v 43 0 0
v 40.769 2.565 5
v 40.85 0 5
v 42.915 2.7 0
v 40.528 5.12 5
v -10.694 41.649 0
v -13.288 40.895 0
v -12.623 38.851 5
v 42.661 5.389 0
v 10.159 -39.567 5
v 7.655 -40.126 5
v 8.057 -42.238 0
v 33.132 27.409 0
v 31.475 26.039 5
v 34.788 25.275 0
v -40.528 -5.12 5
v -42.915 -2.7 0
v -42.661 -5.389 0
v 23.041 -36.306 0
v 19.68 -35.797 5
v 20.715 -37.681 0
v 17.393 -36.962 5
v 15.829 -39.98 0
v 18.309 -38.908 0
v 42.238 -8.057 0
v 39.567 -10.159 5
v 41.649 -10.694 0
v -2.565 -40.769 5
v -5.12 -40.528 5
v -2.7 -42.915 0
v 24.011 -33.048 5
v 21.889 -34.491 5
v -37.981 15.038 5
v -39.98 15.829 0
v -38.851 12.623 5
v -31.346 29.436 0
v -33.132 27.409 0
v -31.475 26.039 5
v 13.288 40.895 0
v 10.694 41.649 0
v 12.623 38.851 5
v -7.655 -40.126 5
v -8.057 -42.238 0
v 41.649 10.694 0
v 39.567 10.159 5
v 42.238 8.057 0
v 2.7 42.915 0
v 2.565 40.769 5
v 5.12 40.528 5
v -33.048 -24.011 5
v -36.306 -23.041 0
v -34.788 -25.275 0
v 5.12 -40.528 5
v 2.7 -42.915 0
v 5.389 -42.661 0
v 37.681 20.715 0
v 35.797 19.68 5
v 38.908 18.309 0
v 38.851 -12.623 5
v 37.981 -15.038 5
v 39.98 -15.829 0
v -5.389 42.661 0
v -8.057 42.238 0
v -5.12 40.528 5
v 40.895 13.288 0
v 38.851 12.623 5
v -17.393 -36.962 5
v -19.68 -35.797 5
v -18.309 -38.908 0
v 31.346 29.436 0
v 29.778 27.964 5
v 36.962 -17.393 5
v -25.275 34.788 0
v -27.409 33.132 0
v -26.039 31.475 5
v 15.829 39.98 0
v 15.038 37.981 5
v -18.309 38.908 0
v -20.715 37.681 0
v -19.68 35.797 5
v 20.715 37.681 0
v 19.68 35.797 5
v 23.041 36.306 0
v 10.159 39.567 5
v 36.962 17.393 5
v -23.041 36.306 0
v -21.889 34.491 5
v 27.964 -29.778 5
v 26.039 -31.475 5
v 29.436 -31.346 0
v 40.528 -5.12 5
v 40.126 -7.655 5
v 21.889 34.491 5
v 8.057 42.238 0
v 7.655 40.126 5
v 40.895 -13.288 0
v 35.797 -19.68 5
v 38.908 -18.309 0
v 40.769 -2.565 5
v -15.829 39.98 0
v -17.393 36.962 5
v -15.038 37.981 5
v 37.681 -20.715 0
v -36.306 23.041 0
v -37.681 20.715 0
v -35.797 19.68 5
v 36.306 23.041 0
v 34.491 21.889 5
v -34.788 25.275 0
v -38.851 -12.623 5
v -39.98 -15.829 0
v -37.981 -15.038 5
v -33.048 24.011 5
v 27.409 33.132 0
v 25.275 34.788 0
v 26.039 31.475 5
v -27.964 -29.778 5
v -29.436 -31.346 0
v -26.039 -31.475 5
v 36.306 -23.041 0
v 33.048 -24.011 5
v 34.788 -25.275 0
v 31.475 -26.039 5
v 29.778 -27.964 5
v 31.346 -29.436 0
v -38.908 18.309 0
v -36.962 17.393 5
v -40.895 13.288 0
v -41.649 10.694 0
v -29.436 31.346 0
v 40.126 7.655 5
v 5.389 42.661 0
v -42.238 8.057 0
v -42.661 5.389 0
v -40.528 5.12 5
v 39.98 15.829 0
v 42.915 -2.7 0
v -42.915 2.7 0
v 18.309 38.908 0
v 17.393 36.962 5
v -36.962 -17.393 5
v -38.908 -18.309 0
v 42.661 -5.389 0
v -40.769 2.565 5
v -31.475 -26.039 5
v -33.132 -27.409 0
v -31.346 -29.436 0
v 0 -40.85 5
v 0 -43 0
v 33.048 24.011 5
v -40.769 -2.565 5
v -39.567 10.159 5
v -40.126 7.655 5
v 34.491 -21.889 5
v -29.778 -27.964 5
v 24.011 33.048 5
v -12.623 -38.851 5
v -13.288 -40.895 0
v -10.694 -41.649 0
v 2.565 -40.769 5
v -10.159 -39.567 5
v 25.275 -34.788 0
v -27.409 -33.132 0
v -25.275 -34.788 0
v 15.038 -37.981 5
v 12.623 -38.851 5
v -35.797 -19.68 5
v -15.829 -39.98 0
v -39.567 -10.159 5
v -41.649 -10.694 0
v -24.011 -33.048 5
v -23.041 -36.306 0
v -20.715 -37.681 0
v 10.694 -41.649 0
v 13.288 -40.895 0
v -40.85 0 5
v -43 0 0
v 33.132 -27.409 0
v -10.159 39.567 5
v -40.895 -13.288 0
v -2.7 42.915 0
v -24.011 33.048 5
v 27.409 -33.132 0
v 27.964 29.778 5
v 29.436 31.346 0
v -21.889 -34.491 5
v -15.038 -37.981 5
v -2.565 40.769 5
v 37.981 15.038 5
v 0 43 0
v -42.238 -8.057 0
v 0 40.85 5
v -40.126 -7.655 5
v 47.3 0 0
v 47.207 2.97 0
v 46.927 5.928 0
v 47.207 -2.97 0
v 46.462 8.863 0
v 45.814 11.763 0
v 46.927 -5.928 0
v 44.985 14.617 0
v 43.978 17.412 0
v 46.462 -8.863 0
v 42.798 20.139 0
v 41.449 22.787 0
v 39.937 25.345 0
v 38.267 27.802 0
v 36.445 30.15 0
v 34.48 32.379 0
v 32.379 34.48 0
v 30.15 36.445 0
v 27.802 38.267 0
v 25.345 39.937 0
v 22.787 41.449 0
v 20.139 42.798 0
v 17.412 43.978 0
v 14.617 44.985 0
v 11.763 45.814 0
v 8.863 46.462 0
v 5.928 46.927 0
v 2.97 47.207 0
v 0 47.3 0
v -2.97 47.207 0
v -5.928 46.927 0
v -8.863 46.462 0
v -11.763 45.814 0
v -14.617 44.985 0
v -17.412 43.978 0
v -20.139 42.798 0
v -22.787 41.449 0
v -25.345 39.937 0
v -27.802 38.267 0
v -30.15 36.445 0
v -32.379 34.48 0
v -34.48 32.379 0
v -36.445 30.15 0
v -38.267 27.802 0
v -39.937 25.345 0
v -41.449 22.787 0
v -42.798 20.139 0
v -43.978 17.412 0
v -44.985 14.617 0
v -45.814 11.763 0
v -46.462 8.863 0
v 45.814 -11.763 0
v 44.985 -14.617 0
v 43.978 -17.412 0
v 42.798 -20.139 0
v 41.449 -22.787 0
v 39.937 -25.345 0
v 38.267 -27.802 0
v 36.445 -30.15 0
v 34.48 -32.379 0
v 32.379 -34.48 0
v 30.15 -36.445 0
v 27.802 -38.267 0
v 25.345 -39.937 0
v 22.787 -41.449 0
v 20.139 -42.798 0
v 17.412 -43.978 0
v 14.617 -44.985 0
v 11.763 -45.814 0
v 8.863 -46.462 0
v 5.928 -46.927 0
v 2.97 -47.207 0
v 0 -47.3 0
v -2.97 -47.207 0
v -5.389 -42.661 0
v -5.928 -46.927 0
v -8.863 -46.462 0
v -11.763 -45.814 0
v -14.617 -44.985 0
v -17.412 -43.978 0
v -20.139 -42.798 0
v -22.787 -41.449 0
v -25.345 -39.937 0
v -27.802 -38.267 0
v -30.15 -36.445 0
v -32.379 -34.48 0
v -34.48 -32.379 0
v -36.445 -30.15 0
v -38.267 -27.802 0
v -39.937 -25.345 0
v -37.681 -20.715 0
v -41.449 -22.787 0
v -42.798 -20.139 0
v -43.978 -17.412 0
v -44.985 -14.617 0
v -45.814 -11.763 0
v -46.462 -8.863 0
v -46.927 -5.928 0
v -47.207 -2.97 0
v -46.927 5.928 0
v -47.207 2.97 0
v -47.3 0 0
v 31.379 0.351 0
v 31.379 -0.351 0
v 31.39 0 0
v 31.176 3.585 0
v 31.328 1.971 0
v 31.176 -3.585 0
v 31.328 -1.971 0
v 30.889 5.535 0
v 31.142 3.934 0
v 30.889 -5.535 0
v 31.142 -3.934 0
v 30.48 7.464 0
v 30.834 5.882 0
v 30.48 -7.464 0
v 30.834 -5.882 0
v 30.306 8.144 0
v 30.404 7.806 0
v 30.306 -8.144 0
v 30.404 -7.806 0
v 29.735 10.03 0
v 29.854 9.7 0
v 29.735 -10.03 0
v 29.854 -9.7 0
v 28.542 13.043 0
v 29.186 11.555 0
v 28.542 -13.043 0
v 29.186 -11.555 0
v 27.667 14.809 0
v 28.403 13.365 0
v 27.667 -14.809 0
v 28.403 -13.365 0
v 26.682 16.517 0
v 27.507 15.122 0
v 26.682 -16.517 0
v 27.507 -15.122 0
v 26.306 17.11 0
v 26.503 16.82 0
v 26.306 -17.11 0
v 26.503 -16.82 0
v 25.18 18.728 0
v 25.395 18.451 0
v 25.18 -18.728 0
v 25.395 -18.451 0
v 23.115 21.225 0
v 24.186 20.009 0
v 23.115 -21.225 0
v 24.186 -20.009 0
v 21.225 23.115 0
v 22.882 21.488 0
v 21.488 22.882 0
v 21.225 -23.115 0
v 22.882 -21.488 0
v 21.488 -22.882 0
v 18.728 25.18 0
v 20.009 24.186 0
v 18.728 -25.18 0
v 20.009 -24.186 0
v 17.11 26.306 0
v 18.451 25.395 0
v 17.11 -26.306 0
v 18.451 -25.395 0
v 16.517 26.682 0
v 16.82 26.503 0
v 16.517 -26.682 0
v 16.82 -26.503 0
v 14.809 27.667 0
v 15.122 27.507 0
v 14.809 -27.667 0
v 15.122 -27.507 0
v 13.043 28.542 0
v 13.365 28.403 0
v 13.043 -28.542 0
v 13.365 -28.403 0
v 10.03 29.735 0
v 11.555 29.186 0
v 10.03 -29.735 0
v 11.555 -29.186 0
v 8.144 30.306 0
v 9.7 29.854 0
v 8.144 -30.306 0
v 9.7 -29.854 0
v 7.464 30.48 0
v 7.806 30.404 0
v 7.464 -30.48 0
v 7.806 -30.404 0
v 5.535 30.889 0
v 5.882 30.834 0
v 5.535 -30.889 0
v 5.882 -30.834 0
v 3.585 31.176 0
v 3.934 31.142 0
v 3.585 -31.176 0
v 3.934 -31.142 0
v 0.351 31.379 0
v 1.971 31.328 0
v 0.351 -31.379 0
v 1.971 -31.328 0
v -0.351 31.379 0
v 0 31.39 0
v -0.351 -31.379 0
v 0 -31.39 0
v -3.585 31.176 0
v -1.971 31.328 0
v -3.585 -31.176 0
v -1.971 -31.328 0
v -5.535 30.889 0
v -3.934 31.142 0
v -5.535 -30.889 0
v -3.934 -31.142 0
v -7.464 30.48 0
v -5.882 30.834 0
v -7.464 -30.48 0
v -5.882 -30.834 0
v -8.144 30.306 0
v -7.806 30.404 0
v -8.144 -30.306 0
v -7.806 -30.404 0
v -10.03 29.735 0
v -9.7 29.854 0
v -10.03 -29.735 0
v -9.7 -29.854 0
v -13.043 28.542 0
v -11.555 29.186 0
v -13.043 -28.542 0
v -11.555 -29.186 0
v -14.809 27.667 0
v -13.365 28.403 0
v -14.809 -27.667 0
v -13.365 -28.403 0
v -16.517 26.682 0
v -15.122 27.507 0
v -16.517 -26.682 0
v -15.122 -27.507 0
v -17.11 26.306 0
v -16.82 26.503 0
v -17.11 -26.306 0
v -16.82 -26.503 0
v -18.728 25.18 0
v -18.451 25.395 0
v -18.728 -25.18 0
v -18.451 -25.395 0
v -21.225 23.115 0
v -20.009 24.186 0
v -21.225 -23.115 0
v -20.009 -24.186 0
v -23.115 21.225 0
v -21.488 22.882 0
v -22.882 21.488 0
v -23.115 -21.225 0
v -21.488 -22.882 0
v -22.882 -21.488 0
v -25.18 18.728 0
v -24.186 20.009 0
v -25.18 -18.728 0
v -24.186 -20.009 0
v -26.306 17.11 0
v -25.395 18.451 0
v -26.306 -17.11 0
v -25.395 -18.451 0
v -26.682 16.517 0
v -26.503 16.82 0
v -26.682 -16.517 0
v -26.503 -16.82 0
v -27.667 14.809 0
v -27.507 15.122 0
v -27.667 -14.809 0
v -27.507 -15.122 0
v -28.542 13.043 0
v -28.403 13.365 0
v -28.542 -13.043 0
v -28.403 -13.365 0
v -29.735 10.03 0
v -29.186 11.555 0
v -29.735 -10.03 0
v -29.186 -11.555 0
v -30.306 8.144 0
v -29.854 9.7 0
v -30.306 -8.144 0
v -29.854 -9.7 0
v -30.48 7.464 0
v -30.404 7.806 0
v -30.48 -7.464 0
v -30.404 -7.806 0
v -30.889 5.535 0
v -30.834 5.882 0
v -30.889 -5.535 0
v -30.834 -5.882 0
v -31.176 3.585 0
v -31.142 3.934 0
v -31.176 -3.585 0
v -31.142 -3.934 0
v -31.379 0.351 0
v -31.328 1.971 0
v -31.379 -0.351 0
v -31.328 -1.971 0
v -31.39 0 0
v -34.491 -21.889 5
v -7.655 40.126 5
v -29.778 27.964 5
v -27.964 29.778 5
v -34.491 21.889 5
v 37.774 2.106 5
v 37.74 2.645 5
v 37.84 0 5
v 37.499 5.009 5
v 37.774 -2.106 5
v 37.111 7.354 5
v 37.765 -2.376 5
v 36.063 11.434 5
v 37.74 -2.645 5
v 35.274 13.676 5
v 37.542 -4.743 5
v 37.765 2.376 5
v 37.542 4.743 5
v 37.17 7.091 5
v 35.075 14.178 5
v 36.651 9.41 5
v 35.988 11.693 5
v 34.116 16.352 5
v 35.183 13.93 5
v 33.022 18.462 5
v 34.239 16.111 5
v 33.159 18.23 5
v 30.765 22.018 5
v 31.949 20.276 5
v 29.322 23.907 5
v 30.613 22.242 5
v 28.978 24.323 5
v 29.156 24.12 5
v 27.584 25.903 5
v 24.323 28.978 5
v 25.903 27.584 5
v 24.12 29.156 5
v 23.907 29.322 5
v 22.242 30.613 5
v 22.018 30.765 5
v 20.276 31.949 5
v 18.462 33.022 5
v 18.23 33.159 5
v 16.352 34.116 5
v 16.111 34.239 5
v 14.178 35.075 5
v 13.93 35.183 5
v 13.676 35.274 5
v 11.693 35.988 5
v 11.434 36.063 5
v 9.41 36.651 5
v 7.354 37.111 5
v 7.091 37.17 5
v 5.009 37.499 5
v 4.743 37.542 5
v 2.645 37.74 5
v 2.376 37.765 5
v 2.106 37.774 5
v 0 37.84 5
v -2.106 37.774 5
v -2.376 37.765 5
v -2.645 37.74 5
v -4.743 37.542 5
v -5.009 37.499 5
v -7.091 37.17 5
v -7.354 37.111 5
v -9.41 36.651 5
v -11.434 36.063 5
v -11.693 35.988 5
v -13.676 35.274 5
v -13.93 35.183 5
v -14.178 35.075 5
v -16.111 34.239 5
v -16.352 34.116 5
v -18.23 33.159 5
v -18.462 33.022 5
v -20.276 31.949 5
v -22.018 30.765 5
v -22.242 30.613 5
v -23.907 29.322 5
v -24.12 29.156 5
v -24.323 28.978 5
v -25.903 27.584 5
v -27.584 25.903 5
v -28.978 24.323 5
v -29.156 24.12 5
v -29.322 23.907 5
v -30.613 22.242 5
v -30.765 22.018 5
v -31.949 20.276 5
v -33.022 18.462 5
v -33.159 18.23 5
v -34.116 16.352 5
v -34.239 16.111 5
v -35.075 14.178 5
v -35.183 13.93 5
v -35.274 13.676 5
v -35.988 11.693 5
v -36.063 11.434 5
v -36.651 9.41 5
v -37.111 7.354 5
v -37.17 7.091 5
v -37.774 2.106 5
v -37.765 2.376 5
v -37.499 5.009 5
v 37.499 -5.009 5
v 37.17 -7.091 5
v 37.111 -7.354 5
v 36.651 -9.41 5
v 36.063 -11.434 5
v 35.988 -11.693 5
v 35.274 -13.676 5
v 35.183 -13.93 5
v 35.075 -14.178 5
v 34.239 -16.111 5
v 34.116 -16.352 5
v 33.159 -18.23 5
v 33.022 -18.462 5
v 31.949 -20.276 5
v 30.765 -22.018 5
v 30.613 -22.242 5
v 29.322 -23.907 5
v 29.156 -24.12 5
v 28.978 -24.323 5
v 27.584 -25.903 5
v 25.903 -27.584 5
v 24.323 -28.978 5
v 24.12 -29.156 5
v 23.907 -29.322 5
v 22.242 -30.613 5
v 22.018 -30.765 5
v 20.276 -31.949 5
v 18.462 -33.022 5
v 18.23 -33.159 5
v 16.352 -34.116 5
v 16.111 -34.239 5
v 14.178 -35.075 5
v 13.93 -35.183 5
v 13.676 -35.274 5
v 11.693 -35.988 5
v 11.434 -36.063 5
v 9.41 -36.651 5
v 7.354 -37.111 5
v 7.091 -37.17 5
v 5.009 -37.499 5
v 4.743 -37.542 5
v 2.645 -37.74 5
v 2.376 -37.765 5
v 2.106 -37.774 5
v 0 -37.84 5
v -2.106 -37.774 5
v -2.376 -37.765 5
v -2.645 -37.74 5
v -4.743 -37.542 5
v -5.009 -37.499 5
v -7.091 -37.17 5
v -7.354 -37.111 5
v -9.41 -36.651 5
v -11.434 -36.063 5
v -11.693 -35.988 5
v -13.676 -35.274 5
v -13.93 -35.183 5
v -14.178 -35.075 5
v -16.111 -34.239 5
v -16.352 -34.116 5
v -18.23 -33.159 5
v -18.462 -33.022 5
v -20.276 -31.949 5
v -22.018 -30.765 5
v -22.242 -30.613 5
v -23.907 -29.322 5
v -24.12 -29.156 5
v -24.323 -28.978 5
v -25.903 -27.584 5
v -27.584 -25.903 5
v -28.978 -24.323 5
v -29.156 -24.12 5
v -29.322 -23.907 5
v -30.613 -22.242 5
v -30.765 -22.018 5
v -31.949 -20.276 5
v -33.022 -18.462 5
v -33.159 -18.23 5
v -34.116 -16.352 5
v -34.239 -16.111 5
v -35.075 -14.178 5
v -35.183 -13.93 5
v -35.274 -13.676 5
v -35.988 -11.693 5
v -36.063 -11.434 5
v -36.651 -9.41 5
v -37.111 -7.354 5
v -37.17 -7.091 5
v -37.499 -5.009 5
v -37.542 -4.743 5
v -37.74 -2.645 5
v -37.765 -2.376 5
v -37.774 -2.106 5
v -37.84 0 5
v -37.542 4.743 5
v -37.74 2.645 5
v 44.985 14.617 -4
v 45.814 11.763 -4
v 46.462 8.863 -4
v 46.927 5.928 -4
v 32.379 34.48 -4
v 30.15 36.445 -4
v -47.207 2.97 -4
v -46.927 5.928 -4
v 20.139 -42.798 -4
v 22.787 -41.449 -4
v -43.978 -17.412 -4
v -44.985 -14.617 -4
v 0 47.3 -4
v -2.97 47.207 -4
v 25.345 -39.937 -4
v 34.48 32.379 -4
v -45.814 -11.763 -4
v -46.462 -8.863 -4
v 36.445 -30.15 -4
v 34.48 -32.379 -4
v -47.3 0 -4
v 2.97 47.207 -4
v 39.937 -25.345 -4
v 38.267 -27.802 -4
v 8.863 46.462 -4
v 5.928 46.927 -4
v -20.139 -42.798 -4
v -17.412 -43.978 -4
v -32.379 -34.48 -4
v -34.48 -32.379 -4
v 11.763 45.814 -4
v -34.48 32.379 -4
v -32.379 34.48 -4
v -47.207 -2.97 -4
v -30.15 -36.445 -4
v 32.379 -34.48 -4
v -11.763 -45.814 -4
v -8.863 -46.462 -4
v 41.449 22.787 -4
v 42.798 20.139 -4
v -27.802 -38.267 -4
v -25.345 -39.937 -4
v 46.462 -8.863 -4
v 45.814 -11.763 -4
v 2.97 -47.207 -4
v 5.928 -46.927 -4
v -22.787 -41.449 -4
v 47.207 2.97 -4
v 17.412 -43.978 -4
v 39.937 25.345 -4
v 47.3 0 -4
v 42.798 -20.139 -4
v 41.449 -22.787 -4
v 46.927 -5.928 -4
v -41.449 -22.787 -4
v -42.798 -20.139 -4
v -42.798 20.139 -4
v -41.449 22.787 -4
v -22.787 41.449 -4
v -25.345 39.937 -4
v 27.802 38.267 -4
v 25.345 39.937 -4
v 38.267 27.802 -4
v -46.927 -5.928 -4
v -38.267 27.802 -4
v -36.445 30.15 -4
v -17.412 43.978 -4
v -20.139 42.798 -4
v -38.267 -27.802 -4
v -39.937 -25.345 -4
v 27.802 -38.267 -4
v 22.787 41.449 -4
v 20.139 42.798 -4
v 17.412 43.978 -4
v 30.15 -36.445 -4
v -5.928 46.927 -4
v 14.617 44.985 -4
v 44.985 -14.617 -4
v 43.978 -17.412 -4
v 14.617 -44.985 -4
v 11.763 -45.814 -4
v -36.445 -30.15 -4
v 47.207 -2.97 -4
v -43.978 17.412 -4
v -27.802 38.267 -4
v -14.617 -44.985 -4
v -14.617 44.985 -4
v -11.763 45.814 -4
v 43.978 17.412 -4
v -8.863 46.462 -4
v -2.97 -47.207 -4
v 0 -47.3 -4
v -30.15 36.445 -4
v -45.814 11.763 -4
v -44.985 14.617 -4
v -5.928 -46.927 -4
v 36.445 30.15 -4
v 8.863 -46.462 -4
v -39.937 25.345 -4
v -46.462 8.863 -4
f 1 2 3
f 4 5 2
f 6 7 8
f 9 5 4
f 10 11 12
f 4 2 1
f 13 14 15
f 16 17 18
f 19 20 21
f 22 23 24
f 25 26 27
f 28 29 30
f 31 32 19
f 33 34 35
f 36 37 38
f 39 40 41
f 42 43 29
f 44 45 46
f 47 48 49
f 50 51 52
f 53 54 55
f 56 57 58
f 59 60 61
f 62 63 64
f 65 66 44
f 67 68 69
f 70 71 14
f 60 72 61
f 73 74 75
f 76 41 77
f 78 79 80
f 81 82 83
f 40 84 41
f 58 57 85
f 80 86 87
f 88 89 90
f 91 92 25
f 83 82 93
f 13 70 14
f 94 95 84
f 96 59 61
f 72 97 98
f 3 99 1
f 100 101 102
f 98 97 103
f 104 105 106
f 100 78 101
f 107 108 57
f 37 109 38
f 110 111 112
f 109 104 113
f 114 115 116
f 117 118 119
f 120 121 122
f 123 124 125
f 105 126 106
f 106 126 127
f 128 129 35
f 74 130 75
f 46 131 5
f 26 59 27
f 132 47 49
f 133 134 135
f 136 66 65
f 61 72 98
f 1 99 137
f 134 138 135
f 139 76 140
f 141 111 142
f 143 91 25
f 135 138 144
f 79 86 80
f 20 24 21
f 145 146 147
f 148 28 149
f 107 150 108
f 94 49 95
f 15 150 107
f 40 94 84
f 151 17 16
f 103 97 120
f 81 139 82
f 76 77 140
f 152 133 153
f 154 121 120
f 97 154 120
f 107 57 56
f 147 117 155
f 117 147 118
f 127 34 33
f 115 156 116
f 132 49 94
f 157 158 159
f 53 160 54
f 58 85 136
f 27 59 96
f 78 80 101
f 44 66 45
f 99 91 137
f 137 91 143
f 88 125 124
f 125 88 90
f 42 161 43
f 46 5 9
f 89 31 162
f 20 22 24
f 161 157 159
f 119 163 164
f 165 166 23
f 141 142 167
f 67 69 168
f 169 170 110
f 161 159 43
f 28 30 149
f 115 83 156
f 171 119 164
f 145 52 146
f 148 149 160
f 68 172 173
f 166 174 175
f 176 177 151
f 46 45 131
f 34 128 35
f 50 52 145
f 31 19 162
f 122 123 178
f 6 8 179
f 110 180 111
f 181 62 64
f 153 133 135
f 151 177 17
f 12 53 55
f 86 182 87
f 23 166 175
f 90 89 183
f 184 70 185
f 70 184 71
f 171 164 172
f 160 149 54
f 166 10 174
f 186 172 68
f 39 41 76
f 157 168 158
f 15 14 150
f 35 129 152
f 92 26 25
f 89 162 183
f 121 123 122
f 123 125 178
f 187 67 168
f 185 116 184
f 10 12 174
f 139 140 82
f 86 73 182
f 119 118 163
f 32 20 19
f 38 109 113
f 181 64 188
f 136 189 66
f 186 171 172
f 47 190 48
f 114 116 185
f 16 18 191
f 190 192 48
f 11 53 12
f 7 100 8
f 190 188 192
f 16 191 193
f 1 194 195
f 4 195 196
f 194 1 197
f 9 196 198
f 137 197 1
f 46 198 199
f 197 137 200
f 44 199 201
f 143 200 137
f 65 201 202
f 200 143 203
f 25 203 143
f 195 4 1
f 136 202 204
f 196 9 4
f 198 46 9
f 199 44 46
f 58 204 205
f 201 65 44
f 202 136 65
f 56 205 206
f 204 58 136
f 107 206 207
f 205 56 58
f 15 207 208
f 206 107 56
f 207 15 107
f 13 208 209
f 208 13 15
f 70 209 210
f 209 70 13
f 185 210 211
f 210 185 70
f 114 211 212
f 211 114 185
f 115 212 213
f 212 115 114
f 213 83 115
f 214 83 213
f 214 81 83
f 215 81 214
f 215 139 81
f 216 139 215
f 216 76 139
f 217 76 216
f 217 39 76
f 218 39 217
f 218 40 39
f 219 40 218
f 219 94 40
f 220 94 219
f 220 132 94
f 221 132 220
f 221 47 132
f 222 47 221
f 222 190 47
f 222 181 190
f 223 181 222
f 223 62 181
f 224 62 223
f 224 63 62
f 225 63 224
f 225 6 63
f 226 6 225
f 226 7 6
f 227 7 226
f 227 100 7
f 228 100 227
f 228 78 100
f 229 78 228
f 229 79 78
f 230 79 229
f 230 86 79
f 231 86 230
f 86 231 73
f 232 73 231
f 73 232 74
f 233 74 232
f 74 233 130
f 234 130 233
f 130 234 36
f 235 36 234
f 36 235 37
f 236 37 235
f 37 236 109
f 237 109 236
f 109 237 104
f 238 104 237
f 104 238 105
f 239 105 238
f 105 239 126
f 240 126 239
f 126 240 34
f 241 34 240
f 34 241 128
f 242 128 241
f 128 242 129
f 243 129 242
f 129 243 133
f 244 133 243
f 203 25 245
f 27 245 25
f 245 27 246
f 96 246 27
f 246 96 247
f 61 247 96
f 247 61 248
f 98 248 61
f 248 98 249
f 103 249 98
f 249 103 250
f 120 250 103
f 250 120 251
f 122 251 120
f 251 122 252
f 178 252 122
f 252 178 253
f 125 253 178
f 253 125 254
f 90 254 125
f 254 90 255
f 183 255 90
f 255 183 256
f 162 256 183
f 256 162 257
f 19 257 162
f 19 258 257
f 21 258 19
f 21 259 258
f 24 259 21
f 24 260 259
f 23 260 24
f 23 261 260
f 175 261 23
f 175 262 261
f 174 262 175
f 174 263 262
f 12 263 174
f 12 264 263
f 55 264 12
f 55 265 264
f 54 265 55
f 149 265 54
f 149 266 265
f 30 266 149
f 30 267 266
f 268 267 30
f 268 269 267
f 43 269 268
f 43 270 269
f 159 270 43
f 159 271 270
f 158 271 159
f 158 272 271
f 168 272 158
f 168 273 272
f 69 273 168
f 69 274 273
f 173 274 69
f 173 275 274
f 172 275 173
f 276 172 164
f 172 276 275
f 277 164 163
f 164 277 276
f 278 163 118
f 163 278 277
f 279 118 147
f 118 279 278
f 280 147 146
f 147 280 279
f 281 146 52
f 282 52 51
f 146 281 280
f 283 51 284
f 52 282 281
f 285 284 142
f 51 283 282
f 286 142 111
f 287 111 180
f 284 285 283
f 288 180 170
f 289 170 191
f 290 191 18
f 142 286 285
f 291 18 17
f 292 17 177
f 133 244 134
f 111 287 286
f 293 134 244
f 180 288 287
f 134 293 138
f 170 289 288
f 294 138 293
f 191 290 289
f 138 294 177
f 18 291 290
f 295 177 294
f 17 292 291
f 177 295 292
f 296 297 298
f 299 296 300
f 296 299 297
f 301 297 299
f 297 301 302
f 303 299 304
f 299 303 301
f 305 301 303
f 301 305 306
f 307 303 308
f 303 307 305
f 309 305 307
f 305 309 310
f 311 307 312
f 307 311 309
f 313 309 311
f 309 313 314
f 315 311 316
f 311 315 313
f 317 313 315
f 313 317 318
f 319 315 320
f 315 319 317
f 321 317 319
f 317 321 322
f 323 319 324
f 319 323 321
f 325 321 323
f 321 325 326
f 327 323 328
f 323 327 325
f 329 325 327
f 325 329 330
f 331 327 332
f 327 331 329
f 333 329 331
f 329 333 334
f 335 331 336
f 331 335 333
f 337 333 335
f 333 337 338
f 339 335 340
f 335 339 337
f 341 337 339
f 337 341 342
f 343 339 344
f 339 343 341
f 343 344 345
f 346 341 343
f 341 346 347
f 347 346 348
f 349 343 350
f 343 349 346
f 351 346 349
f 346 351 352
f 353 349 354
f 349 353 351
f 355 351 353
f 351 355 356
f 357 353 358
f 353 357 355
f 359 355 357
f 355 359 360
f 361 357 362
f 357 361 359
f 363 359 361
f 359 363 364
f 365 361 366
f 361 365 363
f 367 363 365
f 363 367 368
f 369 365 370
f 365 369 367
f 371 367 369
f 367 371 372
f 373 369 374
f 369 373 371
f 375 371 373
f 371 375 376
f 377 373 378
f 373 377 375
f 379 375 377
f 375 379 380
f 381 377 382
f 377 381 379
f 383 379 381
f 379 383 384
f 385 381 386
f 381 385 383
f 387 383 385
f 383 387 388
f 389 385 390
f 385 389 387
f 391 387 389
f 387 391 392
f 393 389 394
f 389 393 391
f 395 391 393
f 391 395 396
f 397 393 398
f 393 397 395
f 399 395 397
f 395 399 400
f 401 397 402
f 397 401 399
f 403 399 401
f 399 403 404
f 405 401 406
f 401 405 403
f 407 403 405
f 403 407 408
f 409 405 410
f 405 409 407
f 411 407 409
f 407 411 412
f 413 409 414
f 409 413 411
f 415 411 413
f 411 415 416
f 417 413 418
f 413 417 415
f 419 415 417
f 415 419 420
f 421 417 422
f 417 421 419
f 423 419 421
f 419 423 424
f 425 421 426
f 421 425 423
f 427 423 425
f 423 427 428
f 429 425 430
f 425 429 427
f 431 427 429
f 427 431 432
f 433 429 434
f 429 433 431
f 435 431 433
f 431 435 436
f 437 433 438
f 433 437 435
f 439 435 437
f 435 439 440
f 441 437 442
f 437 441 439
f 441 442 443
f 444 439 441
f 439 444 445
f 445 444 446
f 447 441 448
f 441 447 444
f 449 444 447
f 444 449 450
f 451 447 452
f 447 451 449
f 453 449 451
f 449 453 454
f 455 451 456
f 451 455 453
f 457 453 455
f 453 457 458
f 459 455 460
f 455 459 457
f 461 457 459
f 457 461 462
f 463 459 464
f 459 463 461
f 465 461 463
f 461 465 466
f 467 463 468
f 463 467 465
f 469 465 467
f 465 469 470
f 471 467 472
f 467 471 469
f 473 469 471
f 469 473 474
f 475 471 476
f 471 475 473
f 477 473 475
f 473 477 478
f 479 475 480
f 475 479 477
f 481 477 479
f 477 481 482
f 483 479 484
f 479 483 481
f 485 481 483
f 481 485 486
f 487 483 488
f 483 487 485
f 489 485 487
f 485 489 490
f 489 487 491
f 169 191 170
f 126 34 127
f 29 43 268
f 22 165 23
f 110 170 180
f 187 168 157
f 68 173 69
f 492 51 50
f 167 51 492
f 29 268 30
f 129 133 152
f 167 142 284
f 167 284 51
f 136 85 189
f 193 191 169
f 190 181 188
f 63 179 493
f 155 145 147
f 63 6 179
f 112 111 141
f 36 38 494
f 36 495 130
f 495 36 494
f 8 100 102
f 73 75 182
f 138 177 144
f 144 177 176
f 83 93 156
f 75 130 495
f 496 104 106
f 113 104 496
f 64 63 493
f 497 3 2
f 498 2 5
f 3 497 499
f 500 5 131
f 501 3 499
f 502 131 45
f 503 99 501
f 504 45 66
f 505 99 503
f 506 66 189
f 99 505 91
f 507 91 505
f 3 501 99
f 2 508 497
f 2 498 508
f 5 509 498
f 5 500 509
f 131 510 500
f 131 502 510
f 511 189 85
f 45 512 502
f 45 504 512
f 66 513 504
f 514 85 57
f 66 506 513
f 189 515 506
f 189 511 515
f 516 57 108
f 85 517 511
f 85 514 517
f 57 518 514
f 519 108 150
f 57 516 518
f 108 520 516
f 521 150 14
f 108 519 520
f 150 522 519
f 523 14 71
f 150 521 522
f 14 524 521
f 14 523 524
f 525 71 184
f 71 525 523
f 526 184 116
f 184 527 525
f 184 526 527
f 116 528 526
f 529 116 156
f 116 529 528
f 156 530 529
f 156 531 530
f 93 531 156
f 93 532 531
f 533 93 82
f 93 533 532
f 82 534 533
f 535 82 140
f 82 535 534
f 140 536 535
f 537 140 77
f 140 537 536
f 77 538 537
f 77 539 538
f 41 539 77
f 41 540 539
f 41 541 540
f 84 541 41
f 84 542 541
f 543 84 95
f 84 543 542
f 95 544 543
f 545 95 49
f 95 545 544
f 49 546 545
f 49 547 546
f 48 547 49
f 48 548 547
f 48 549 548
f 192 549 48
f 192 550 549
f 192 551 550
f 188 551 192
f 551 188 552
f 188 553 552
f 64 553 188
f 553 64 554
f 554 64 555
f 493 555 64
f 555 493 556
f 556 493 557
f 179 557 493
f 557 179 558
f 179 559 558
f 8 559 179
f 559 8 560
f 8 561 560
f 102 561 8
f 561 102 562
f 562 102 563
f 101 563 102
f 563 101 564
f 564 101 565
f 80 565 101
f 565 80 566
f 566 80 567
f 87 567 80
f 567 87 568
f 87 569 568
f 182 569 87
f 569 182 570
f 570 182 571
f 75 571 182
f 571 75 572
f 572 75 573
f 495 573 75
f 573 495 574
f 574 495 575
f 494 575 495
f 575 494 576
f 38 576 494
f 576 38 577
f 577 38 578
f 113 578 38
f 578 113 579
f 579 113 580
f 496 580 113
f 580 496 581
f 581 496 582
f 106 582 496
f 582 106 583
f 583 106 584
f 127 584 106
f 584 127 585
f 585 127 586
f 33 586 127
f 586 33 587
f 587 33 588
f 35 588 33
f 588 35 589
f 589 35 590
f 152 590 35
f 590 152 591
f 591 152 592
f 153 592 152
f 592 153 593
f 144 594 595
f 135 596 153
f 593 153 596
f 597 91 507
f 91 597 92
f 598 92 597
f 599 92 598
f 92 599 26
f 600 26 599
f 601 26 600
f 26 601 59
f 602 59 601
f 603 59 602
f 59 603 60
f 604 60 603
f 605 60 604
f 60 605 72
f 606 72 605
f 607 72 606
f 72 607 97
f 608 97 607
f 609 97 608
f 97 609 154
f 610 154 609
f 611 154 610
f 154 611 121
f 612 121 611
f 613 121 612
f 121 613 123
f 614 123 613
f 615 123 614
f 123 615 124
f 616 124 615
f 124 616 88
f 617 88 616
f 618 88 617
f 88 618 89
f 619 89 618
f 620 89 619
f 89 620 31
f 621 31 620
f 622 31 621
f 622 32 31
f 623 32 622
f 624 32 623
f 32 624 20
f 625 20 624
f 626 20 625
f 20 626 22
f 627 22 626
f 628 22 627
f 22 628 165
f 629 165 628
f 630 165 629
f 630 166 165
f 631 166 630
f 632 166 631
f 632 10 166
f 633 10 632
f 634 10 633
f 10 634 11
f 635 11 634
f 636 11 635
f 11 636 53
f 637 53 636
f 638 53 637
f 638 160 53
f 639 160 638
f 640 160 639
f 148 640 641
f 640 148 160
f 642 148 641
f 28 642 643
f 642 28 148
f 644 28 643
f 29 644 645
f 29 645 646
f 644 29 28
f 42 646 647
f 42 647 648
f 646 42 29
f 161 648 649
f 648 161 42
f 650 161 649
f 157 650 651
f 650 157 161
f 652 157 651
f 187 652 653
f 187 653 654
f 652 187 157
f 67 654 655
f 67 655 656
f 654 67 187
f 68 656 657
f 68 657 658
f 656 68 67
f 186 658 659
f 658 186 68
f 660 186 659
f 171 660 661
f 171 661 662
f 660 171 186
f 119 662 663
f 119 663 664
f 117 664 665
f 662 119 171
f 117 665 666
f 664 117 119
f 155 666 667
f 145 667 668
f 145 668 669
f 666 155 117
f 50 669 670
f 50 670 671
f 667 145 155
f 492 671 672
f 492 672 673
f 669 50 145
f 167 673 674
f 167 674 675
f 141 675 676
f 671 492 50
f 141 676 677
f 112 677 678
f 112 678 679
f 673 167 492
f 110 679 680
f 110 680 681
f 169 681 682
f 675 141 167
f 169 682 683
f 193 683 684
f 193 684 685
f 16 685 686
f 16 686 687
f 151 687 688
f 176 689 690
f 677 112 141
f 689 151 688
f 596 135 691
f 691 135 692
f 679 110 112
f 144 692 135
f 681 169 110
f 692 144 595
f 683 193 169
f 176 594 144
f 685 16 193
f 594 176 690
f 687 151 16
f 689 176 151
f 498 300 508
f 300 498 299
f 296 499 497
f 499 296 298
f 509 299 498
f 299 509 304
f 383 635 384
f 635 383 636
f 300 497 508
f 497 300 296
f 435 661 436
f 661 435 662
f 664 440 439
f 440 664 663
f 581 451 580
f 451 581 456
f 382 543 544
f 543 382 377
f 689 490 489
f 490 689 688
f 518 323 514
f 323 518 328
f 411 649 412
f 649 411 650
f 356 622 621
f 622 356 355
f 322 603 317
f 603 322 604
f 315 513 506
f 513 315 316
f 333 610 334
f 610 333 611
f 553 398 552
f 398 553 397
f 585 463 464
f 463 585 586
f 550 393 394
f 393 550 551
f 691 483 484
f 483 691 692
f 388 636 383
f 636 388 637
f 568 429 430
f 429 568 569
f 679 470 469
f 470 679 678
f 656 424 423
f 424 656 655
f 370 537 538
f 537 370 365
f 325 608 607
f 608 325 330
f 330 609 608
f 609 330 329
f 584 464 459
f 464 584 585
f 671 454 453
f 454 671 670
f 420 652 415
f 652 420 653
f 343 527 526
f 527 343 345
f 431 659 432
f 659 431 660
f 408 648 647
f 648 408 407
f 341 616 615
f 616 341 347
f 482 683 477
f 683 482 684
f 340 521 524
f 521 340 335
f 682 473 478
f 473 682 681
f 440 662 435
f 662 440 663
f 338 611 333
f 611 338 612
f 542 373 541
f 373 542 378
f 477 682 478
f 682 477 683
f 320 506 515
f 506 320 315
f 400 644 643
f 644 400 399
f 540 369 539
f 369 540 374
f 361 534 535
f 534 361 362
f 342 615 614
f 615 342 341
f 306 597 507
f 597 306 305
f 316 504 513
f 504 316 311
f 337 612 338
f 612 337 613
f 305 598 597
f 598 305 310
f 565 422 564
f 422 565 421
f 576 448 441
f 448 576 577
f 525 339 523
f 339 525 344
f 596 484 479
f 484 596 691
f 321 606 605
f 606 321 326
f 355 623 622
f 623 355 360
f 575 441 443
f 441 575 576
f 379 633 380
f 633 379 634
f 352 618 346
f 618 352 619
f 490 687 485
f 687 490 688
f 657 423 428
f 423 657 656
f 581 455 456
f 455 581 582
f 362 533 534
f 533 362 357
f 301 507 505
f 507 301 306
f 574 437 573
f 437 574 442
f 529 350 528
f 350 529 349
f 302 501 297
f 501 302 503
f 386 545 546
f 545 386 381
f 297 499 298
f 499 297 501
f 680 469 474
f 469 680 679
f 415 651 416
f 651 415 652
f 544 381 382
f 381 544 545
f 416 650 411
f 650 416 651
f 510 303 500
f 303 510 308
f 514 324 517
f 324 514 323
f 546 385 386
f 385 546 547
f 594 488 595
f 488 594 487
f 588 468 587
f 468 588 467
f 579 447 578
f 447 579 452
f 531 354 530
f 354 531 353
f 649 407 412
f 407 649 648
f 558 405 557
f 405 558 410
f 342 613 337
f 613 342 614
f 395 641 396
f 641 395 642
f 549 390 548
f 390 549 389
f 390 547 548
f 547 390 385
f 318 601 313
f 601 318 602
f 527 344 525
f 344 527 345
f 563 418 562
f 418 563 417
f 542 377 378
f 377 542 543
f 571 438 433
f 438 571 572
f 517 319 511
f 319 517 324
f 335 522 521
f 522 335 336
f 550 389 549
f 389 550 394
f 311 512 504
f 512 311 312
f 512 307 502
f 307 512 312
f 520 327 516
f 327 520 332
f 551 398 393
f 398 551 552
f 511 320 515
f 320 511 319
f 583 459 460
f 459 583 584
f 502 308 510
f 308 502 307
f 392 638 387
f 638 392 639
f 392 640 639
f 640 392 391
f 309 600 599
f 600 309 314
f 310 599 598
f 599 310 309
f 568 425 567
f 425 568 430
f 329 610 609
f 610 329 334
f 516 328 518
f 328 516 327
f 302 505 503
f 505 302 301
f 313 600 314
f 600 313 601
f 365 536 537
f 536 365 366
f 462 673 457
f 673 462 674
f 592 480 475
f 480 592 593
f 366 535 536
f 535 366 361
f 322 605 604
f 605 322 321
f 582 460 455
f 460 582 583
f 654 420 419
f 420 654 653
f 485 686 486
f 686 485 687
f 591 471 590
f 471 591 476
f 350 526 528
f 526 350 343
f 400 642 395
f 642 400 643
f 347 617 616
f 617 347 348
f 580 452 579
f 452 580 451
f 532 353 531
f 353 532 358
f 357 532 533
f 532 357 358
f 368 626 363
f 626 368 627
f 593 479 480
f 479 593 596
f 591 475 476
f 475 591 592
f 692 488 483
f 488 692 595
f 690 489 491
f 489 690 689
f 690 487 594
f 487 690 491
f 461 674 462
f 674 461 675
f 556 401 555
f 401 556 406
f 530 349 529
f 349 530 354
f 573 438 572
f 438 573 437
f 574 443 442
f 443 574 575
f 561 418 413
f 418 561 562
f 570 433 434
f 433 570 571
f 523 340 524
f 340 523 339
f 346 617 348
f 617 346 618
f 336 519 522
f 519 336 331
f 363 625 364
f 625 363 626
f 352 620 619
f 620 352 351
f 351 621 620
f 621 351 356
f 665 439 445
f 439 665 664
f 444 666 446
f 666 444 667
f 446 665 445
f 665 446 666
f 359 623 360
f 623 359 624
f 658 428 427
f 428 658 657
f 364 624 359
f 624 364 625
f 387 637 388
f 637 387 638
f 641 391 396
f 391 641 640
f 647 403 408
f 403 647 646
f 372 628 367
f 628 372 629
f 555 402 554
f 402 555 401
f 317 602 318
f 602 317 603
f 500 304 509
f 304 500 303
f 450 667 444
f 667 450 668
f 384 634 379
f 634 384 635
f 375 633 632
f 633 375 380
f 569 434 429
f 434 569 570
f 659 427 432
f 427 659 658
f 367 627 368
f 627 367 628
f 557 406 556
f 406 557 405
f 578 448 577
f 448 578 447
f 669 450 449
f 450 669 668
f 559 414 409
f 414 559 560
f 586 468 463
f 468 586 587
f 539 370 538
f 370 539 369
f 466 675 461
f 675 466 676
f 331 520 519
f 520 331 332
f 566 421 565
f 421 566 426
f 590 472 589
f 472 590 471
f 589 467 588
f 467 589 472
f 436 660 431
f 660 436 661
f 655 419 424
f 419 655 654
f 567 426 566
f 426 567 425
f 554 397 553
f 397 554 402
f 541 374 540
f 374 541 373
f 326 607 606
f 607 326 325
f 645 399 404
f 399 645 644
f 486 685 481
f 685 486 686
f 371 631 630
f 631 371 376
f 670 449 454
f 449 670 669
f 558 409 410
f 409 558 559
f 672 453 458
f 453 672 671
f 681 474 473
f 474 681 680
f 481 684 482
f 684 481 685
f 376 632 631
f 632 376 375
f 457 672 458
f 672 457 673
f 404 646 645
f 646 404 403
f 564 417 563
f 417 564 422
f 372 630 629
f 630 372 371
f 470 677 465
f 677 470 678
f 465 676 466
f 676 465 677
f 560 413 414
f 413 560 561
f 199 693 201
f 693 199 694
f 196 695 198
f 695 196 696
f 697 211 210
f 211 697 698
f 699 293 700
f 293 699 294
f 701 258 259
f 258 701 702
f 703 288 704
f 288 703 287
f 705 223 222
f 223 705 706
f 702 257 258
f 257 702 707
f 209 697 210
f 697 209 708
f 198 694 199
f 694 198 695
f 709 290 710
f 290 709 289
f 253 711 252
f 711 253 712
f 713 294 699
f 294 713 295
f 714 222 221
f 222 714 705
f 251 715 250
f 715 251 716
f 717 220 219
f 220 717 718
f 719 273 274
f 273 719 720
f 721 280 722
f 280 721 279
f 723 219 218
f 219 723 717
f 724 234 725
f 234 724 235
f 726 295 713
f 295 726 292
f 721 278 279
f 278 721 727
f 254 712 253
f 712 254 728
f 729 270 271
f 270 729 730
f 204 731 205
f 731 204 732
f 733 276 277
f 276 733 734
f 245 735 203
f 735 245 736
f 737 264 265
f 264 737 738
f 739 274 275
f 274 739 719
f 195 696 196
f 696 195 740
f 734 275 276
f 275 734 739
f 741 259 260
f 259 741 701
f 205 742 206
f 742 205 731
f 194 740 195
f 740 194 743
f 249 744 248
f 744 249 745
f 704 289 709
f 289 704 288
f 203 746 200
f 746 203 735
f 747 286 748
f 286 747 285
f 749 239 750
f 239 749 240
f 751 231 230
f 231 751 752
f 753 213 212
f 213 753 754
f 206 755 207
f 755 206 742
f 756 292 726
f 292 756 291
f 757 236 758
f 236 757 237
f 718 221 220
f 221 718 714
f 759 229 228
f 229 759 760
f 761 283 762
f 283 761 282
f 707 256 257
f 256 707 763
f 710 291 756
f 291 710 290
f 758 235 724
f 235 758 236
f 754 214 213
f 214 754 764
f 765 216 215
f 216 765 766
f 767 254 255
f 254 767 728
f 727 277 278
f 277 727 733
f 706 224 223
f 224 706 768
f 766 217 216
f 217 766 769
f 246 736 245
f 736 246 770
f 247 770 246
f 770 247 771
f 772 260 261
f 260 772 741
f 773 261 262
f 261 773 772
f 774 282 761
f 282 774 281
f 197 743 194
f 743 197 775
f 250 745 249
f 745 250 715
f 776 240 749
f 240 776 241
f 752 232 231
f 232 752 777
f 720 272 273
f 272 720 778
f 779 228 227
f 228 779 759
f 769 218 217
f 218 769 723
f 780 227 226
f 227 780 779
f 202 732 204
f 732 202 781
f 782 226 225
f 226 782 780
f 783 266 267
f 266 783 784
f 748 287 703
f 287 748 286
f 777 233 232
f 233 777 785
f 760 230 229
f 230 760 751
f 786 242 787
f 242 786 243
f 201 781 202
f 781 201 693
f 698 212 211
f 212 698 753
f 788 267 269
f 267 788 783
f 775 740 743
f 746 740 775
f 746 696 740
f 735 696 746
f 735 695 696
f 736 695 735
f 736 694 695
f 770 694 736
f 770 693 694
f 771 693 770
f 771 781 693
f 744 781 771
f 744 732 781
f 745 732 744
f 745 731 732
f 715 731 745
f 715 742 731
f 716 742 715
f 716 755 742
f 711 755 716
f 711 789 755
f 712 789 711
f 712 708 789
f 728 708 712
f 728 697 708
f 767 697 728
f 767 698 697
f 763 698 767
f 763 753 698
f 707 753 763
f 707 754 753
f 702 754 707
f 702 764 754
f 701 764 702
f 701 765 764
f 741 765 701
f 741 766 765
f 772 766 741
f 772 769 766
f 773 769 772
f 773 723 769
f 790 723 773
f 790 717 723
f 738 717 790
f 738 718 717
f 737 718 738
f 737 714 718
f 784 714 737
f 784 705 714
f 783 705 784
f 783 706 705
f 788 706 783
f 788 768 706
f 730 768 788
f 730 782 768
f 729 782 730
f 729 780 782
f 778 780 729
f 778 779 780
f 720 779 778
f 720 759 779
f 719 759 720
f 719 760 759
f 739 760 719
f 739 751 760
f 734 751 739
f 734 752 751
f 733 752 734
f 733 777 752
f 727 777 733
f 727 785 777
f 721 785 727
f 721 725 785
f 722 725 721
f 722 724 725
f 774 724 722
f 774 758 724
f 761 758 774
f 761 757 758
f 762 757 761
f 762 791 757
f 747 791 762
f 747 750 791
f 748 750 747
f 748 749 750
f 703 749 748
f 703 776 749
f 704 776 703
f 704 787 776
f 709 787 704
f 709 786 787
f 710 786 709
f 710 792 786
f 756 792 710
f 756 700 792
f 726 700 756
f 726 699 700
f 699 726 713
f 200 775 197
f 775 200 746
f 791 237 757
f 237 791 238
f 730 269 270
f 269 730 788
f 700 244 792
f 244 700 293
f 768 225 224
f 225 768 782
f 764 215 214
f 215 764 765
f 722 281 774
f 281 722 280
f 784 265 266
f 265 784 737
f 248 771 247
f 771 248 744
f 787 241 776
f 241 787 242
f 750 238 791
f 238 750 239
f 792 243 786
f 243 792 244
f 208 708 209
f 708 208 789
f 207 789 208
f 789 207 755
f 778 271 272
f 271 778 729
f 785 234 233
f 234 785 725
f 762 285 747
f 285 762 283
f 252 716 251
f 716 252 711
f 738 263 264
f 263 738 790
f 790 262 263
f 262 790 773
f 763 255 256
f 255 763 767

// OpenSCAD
// file: yogurt_lid_lib.scad
module lid_base() {
  // scale 110% in x and y
  // should be about +4ms on each side
  scale([1.1, 1.1, 1]) {
    linear_extrude(height=4) {
      children();
    }
  }
}

module lid_wedge() {
  difference() {
    linear_extrude(height=5, scale=0.95) {
      children();
    }
    translate([0, 0, -1]) {
      linear_extrude(height=7, scale=1.3) {
        scale([0.7, 0.7, 1]) children();
      }
    }
  }
}

module yogurt_lid() {
  scale([1, 1, -1]) lid_base() children();
  lid_wedge() children();
}
// main file
include <yogurt_lid_lib.scad>

$fn = 100;

yogurt_lid() circle(r=43);
